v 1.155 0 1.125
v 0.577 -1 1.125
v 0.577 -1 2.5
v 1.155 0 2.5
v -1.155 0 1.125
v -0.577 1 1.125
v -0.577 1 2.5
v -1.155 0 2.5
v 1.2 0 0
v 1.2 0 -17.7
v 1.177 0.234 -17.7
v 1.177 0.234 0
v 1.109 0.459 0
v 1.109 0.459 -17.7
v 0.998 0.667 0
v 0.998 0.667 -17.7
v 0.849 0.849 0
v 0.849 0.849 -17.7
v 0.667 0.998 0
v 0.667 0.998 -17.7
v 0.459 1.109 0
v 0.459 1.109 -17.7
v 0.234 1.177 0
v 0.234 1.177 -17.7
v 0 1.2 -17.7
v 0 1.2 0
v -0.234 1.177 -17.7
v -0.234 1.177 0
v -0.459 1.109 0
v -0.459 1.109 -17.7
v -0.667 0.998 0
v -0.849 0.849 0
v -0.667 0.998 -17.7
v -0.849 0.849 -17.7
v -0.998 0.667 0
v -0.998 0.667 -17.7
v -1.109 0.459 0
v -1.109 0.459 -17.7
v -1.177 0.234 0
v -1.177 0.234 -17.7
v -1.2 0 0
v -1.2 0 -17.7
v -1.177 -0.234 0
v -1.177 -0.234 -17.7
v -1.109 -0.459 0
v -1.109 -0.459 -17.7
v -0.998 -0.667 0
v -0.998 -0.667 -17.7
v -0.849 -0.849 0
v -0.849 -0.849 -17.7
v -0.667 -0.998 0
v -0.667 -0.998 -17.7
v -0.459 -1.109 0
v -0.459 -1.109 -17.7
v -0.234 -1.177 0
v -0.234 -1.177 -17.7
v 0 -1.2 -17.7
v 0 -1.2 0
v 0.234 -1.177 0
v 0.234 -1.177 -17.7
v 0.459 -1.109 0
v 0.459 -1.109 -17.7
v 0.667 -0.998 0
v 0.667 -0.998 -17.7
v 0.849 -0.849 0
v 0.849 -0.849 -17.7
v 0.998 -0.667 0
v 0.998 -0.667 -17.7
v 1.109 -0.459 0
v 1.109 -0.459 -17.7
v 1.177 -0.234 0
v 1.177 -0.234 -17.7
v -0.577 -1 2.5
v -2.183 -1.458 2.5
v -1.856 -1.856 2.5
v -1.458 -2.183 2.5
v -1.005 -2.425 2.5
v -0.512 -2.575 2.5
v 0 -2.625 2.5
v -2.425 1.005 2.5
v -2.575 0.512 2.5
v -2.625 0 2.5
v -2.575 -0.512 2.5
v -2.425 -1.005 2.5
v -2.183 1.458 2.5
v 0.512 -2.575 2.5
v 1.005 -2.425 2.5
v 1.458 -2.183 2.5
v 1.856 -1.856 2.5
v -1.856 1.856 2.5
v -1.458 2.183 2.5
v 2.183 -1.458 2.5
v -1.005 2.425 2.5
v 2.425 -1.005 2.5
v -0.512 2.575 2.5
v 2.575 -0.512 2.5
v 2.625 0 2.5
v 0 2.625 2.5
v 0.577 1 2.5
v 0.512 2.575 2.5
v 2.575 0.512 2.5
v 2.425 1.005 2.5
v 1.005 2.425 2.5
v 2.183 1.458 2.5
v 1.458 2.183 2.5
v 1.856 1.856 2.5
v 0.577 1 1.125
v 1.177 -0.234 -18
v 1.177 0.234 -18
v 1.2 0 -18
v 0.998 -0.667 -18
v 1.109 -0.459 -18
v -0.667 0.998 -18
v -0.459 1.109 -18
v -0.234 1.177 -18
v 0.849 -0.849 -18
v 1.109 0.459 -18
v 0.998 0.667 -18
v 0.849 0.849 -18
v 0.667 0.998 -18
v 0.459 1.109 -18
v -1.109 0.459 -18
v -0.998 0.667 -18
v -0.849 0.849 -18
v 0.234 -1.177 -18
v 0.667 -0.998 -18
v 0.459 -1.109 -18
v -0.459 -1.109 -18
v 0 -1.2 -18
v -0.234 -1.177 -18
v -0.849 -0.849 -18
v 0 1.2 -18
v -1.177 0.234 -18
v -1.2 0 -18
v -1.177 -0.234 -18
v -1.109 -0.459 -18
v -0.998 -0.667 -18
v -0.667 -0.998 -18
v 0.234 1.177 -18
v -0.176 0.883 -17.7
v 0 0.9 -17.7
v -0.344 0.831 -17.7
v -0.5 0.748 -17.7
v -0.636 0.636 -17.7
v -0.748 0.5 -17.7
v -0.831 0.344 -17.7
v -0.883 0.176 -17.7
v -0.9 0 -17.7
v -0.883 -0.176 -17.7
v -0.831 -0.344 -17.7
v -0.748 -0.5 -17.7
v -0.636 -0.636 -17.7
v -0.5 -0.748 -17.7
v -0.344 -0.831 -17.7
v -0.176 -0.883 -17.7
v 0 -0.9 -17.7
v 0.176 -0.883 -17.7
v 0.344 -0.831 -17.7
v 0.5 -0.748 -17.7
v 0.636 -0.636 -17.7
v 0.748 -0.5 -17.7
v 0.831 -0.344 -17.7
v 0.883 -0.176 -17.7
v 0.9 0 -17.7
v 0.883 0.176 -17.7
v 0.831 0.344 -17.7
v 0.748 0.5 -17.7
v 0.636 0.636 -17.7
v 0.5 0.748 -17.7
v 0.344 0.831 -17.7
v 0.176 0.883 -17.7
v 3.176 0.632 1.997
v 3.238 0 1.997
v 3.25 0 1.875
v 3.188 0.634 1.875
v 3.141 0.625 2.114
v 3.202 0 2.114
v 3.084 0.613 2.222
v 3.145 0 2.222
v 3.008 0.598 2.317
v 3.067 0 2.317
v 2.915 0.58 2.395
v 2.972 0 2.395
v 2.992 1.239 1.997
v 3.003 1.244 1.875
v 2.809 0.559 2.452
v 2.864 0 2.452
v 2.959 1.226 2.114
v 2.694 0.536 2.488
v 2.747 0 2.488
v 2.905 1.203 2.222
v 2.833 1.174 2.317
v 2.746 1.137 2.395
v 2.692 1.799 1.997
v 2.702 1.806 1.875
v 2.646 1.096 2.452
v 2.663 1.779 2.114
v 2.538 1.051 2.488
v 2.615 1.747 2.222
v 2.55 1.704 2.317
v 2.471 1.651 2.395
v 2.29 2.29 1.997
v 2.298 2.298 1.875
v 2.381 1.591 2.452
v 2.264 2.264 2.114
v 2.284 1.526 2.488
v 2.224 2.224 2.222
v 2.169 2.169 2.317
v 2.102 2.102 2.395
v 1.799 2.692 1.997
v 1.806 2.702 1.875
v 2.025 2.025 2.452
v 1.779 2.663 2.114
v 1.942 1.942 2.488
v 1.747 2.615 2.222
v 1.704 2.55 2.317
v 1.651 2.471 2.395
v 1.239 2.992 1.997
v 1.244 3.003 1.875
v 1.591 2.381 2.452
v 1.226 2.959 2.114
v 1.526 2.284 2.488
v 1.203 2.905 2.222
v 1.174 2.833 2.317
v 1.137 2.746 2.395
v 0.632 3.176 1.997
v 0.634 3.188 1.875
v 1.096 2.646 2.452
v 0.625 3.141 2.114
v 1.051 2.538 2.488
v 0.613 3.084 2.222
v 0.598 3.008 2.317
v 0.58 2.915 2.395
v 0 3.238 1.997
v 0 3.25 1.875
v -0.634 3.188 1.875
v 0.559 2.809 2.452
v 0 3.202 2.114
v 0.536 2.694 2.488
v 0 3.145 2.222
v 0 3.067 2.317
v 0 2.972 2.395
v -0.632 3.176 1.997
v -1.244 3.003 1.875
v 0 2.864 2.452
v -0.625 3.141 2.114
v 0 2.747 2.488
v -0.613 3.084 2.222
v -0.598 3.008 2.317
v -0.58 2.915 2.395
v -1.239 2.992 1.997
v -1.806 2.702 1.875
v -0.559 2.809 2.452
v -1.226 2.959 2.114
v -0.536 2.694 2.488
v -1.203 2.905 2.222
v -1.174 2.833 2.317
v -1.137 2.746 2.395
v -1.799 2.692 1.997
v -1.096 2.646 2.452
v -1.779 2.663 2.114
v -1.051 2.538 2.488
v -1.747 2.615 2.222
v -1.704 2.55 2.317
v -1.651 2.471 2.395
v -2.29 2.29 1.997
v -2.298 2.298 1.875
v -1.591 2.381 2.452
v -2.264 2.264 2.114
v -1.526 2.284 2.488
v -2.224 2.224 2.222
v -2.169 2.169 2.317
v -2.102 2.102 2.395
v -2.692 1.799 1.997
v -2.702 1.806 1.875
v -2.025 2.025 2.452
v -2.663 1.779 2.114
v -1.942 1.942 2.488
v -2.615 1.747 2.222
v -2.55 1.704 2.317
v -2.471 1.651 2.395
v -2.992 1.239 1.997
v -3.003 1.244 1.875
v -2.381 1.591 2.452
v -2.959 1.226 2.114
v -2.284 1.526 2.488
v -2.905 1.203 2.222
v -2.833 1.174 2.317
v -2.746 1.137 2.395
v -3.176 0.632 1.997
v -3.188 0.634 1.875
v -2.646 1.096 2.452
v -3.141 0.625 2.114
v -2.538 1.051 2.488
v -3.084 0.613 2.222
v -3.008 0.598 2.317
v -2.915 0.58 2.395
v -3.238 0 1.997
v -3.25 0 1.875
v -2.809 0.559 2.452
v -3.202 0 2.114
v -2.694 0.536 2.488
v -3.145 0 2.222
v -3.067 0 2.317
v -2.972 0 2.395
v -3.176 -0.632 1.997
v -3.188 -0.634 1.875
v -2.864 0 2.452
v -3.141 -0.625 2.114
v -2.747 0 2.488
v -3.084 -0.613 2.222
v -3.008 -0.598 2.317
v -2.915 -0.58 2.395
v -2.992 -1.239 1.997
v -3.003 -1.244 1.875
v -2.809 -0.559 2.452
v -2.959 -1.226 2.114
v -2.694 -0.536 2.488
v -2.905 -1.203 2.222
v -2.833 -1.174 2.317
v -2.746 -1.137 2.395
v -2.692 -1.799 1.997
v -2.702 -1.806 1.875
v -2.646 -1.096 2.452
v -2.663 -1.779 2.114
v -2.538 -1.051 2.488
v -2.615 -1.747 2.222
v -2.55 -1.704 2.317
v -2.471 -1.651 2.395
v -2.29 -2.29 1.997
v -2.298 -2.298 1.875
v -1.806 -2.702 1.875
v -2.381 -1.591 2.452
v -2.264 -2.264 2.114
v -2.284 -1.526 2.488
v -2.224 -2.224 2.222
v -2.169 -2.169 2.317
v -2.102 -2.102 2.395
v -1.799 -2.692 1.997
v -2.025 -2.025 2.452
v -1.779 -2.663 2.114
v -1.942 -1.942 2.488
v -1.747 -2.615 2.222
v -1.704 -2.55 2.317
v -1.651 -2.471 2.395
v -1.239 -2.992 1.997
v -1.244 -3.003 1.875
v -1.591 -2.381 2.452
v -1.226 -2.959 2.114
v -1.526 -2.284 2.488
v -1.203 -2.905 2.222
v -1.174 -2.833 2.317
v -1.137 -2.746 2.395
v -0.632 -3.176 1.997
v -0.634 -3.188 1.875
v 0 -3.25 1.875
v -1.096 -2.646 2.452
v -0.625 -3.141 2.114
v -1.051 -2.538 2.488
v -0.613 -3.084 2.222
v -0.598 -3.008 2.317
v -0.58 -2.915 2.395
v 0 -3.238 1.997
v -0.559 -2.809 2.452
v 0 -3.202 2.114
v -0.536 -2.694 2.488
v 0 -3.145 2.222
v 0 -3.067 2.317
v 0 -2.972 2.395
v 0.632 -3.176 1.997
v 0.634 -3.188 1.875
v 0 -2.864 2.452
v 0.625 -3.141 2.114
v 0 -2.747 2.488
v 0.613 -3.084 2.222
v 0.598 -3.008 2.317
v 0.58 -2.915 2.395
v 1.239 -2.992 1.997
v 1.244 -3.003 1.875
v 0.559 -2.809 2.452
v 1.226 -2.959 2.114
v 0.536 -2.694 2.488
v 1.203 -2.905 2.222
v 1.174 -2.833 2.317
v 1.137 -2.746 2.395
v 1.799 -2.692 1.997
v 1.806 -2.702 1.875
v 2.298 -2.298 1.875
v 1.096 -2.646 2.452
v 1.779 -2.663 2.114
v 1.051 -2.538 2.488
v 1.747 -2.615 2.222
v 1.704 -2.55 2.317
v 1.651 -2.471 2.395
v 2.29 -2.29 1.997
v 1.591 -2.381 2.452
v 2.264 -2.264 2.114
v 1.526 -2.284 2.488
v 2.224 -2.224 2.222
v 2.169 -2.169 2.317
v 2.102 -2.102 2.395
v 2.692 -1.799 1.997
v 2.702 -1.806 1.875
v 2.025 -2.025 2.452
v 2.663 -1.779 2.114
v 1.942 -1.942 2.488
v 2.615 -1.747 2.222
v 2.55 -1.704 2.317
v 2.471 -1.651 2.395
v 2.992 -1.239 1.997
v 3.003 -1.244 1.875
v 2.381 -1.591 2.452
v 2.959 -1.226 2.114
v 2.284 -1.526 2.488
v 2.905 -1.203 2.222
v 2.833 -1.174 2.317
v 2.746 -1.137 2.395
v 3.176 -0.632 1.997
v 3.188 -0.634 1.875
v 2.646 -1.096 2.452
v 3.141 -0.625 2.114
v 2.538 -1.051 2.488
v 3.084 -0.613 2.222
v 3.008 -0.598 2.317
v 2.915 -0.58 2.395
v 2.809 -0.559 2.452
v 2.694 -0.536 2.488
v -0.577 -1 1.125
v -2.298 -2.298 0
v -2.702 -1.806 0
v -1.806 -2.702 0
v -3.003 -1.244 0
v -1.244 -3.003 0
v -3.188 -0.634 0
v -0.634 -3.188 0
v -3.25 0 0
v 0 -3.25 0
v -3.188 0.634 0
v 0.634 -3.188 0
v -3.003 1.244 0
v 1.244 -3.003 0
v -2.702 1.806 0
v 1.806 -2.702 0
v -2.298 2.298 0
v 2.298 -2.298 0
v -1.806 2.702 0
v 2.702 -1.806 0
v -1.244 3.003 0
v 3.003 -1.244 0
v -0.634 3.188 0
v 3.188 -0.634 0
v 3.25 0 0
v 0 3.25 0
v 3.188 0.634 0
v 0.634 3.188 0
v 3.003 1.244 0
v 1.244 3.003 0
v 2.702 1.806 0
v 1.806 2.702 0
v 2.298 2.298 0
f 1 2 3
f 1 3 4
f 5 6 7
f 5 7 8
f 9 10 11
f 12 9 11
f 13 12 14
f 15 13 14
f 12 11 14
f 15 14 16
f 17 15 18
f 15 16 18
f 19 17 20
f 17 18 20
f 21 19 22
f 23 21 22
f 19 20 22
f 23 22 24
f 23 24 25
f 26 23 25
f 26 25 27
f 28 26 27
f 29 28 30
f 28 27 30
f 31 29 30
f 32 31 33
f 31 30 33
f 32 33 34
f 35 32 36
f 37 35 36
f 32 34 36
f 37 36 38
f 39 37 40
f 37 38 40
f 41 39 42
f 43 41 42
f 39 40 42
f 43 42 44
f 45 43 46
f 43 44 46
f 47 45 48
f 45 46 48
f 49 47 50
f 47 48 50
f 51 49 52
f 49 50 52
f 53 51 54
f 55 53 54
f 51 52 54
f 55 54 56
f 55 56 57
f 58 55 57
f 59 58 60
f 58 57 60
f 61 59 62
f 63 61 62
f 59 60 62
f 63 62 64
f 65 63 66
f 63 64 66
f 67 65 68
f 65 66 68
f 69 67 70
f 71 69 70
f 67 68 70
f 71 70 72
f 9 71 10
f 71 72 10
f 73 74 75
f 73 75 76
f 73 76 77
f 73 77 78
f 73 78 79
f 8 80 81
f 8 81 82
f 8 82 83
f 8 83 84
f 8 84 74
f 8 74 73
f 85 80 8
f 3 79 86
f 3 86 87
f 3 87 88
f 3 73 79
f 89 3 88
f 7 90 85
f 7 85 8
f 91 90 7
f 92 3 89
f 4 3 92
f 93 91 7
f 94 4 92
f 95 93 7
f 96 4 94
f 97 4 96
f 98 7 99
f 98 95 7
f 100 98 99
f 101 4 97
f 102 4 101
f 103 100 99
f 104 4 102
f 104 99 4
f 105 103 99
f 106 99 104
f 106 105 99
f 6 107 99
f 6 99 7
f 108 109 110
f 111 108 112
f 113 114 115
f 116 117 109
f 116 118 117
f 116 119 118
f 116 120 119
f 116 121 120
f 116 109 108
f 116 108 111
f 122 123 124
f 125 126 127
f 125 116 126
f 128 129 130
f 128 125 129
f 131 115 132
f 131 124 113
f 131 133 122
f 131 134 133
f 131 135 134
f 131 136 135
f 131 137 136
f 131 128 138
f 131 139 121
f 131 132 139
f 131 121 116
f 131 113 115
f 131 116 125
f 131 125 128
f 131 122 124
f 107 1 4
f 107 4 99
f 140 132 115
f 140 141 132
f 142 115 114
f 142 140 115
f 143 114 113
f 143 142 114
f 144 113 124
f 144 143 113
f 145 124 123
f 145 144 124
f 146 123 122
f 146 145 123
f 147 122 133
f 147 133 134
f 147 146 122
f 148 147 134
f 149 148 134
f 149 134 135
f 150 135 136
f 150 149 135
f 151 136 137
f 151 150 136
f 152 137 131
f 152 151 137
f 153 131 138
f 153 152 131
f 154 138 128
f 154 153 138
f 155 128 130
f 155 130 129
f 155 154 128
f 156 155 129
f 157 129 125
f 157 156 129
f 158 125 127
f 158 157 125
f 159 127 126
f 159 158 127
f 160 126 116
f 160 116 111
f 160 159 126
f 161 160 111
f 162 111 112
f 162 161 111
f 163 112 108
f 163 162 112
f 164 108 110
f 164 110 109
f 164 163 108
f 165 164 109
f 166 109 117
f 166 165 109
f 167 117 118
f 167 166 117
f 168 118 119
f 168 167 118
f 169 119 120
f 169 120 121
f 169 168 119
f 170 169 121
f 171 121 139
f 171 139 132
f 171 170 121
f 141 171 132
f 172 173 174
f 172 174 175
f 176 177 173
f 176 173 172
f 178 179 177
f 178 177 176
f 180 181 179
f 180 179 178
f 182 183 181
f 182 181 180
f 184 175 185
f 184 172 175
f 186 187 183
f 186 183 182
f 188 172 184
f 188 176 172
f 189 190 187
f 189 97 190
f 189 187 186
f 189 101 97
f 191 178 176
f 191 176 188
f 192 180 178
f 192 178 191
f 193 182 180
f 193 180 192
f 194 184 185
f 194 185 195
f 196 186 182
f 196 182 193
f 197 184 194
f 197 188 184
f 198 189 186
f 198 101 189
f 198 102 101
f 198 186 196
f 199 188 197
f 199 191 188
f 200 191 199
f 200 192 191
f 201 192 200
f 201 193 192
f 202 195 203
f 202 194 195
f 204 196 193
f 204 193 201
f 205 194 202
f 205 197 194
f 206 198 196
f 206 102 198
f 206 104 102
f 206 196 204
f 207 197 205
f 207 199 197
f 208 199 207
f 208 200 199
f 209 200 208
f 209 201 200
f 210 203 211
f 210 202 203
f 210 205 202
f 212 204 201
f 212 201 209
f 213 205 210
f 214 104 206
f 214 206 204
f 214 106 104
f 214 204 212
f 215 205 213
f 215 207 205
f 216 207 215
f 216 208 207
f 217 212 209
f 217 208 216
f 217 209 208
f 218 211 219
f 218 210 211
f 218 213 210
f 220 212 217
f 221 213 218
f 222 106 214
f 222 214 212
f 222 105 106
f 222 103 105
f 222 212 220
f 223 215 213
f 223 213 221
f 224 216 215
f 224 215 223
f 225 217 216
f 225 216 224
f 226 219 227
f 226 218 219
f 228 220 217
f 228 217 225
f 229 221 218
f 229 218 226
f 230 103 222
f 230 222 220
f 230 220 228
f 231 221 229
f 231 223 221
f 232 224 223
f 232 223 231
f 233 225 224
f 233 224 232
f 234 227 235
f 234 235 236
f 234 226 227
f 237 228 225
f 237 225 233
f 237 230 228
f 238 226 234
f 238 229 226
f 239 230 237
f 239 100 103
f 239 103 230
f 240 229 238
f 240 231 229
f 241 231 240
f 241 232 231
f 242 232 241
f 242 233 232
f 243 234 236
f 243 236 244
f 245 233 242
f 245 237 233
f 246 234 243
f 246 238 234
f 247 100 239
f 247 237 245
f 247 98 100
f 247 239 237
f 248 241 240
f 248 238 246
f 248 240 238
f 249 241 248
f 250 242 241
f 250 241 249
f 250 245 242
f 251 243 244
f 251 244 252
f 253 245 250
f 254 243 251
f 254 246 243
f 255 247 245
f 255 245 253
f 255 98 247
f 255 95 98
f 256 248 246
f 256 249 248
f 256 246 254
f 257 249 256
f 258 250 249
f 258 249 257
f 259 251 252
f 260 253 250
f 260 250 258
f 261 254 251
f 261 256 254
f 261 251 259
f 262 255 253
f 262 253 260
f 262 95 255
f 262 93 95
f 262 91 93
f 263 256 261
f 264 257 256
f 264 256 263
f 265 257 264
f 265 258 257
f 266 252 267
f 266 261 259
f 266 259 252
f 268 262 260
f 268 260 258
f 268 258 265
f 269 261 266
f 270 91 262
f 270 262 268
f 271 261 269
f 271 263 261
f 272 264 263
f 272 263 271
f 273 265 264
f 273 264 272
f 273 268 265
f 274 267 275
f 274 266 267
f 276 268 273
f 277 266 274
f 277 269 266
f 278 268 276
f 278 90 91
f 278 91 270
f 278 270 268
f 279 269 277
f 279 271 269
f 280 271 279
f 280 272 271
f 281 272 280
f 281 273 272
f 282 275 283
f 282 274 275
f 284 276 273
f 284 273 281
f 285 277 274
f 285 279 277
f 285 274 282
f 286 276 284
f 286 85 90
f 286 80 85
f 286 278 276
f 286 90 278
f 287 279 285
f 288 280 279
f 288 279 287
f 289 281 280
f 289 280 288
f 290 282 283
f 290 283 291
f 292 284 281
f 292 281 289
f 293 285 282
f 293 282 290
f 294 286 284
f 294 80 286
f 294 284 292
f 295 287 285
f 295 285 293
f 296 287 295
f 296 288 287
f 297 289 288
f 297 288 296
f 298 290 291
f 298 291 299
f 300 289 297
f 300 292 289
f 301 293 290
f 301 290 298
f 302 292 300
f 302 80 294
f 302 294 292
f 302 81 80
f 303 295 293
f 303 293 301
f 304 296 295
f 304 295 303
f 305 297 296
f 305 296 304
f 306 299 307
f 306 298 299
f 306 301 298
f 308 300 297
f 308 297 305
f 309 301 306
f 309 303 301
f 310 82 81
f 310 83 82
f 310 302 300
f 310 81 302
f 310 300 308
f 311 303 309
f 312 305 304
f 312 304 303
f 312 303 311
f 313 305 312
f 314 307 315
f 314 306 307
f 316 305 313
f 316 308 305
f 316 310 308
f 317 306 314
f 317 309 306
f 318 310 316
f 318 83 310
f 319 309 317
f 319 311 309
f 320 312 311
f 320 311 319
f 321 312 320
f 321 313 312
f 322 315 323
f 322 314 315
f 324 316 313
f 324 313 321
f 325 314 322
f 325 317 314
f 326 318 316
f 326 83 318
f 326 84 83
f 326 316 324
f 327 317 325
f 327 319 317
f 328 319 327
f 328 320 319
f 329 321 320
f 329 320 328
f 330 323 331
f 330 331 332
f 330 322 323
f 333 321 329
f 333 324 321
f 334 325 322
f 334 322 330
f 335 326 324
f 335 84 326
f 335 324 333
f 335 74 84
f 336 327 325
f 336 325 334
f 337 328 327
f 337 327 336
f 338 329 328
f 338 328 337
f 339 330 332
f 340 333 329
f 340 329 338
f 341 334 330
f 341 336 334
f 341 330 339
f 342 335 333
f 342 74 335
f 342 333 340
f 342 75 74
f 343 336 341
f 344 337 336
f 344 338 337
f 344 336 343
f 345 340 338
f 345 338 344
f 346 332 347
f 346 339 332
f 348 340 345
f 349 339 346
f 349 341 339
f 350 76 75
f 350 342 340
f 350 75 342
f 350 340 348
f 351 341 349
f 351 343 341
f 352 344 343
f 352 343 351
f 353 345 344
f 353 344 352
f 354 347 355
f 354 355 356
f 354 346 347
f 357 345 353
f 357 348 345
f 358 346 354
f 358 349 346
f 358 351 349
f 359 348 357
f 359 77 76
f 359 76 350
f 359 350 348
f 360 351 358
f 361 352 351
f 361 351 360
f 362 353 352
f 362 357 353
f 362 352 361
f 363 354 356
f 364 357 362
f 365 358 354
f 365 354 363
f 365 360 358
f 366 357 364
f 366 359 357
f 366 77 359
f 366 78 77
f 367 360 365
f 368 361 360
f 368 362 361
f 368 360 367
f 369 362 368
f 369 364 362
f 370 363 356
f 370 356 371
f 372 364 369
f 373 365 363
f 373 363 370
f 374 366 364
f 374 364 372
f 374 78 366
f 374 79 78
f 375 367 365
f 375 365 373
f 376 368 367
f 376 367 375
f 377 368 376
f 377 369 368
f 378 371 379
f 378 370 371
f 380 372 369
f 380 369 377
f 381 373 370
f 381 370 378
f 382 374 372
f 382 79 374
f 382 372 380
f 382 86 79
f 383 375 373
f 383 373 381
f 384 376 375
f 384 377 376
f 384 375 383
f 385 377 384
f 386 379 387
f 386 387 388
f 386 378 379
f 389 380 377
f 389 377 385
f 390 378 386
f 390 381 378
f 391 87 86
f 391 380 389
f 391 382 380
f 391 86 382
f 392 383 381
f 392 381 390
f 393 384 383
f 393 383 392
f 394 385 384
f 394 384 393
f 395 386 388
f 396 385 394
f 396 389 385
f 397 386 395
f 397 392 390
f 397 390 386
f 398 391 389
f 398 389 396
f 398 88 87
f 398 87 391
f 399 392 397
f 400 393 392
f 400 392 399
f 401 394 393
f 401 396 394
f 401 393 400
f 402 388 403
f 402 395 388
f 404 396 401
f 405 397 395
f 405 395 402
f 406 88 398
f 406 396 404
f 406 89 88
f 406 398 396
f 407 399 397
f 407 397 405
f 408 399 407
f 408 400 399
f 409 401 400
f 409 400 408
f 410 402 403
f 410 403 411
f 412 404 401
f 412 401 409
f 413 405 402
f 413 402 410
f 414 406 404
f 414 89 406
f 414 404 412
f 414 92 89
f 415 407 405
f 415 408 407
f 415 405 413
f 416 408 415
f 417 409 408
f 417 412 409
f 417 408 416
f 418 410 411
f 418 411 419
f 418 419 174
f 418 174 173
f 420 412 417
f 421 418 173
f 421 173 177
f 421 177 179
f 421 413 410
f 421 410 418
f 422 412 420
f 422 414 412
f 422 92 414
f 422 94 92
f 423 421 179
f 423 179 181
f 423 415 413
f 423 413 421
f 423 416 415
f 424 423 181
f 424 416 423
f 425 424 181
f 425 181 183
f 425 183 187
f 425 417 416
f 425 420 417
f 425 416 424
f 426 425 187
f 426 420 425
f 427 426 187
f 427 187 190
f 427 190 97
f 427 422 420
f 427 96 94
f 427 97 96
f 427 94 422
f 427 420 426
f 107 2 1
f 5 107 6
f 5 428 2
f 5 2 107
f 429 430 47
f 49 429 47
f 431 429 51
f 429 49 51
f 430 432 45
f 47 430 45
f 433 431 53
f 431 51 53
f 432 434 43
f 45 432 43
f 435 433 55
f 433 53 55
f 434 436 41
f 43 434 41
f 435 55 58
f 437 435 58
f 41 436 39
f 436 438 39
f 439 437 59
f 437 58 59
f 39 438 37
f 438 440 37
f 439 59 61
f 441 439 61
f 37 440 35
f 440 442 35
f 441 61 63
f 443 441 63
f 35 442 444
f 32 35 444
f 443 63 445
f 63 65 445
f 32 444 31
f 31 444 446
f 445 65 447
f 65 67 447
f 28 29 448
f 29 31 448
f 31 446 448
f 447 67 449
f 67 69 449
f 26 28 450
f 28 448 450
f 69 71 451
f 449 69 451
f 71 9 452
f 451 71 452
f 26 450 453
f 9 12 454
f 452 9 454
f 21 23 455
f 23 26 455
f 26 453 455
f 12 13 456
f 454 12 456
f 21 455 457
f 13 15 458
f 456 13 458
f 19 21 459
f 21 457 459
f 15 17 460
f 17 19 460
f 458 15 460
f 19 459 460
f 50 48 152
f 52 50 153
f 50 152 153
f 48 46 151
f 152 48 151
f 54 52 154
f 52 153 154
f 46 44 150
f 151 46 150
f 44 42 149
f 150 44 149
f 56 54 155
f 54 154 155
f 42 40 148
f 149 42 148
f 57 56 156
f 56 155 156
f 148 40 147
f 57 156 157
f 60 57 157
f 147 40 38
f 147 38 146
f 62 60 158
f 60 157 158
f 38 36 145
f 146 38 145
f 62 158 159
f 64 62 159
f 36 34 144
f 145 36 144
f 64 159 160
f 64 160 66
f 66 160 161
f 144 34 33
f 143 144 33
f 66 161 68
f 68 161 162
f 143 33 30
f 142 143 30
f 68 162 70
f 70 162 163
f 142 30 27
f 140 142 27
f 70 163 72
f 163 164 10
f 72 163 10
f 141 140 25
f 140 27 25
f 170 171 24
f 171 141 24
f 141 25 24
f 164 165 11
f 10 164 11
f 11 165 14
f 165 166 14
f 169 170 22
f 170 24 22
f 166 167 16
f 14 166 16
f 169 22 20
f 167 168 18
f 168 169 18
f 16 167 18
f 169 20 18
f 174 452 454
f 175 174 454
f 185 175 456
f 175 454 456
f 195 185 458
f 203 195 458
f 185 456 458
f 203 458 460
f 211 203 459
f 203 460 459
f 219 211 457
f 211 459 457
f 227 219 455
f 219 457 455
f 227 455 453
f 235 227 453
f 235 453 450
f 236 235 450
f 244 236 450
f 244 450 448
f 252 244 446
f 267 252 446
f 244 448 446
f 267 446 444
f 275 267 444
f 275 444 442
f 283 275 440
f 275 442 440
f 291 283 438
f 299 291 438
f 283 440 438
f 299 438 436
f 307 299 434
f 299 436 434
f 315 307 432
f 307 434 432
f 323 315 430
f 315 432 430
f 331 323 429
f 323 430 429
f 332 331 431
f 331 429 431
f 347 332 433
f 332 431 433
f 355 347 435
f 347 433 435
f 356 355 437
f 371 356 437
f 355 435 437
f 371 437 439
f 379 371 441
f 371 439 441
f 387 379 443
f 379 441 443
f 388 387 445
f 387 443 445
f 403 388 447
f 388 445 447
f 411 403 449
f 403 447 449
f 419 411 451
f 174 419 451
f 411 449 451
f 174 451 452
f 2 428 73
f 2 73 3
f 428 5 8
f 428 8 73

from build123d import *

# Parameters (mm, degrees)
F_0075_CYLINDER_SKETCH_R    = 3.25
F_0075_CYLINDER_DEPTH       = 2.5
F_0076_FILLET_R             = 0.625
F_0077_EXTRUDE_DEPTH        = 1.385
F_0077_EXTRUDE_ROTATE_ANGLE = 120
F_0080_CYLINDER_SKETCH_R    = 1.2
F_0080_CYLINDER_DEPTH       = 17.7
F_0081_CONE_ROTATE_ANGLE    = 90


with BuildPart() as part:
    # 0075_cylinder_Sketch → 0075_cylinder (new body)
    with BuildSketch(Plane.XY):
        Circle(F_0075_CYLINDER_SKETCH_R)
    extrude(amount=F_0075_CYLINDER_DEPTH)

    # 0076_fillet
    f_0076_fillet_edges = [part.edges().sort_by_distance(p)[0] for p in [
        (-3.25, 0, 2.5),
    ]]
    fillet(f_0076_fillet_edges, radius=F_0076_FILLET_R)


with BuildPart() as body_2:
    # 0077_extrude_Sketch → 0077_extrude (new body)
    with BuildSketch(Plane.XY):
        Polygon((0, 0), (1.154700538, 0), (1.732050808, 1), (1.154700538, 2), (0, 2), (-0.577350269, 1), align=None)
    extrude(amount=F_0077_EXTRUDE_DEPTH)


with BuildPart() as body_2_1:
    # 0077_extrude_Rotate: read off the stored shape, not the designer's step
    # 0077_extrude_Rotate: moved
    add(body_2.part.rotate(Axis((0, 0, 0), (0, 0, 1)), F_0077_EXTRUDE_ROTATE_ANGLE))


with BuildPart() as body_2_2:
    # 0077_extrude_Translate: moved
    add(body_2_1.part.moved(Location((1.154700538, 0, 1.125))))


with BuildPart() as part_1:
    add(part.part)

    # 0079_sub: cut body 2
    add(body_2_2.part, mode=Mode.SUBTRACT)


with BuildPart() as body_2_2_1:
    # 0080_cylinder_Sketch → 0080_cylinder (new body)
    with BuildSketch(Plane.XY):
        Circle(F_0080_CYLINDER_SKETCH_R)
    extrude(amount=F_0080_CYLINDER_DEPTH)


with BuildPart() as body_2_2_2:
    # 0080_cylinder_Translate: moved
    add(body_2_2_1.part.moved(Location((0, 0, -17.7))))


with BuildPart() as body_3:
    # 0081_cone_Sketch → 0081_cone (revolve)
    with BuildSketch(Plane.XY, mode=Mode.PRIVATE) as f_0081_cone_sk:
        Polygon((0, 0), (1.2, 0), (0.9, 0.3), (0, 0.3), align=None)
    revolve(f_0081_cone_sk.sketch.rotate(Axis((0, -100, 0), (0, 1, 0)), 90), axis=Axis((0, -100, 0), (0, 1, 0)))


with BuildPart() as body_3_1:
    # 0081_cone_Rotate: moved
    add(body_3.part.rotate(Axis((0, 0, 0), (1, 0, 0)), F_0081_CONE_ROTATE_ANGLE))


with BuildPart() as body_3_2:
    # 0081_cone_Translate: moved
    add(body_3_1.part.moved(Location((0, 0, -18))))


with BuildPart() as body_2_2_3:
    add(body_2_2_2.part)

    # 0083_add: union body 3
    add(body_3_2.part)


with BuildPart() as part_2:
    add(part_1.part)

    # 0084_add: union body 2 2
    add(body_2_2_3.part)


solid = part_2.part
